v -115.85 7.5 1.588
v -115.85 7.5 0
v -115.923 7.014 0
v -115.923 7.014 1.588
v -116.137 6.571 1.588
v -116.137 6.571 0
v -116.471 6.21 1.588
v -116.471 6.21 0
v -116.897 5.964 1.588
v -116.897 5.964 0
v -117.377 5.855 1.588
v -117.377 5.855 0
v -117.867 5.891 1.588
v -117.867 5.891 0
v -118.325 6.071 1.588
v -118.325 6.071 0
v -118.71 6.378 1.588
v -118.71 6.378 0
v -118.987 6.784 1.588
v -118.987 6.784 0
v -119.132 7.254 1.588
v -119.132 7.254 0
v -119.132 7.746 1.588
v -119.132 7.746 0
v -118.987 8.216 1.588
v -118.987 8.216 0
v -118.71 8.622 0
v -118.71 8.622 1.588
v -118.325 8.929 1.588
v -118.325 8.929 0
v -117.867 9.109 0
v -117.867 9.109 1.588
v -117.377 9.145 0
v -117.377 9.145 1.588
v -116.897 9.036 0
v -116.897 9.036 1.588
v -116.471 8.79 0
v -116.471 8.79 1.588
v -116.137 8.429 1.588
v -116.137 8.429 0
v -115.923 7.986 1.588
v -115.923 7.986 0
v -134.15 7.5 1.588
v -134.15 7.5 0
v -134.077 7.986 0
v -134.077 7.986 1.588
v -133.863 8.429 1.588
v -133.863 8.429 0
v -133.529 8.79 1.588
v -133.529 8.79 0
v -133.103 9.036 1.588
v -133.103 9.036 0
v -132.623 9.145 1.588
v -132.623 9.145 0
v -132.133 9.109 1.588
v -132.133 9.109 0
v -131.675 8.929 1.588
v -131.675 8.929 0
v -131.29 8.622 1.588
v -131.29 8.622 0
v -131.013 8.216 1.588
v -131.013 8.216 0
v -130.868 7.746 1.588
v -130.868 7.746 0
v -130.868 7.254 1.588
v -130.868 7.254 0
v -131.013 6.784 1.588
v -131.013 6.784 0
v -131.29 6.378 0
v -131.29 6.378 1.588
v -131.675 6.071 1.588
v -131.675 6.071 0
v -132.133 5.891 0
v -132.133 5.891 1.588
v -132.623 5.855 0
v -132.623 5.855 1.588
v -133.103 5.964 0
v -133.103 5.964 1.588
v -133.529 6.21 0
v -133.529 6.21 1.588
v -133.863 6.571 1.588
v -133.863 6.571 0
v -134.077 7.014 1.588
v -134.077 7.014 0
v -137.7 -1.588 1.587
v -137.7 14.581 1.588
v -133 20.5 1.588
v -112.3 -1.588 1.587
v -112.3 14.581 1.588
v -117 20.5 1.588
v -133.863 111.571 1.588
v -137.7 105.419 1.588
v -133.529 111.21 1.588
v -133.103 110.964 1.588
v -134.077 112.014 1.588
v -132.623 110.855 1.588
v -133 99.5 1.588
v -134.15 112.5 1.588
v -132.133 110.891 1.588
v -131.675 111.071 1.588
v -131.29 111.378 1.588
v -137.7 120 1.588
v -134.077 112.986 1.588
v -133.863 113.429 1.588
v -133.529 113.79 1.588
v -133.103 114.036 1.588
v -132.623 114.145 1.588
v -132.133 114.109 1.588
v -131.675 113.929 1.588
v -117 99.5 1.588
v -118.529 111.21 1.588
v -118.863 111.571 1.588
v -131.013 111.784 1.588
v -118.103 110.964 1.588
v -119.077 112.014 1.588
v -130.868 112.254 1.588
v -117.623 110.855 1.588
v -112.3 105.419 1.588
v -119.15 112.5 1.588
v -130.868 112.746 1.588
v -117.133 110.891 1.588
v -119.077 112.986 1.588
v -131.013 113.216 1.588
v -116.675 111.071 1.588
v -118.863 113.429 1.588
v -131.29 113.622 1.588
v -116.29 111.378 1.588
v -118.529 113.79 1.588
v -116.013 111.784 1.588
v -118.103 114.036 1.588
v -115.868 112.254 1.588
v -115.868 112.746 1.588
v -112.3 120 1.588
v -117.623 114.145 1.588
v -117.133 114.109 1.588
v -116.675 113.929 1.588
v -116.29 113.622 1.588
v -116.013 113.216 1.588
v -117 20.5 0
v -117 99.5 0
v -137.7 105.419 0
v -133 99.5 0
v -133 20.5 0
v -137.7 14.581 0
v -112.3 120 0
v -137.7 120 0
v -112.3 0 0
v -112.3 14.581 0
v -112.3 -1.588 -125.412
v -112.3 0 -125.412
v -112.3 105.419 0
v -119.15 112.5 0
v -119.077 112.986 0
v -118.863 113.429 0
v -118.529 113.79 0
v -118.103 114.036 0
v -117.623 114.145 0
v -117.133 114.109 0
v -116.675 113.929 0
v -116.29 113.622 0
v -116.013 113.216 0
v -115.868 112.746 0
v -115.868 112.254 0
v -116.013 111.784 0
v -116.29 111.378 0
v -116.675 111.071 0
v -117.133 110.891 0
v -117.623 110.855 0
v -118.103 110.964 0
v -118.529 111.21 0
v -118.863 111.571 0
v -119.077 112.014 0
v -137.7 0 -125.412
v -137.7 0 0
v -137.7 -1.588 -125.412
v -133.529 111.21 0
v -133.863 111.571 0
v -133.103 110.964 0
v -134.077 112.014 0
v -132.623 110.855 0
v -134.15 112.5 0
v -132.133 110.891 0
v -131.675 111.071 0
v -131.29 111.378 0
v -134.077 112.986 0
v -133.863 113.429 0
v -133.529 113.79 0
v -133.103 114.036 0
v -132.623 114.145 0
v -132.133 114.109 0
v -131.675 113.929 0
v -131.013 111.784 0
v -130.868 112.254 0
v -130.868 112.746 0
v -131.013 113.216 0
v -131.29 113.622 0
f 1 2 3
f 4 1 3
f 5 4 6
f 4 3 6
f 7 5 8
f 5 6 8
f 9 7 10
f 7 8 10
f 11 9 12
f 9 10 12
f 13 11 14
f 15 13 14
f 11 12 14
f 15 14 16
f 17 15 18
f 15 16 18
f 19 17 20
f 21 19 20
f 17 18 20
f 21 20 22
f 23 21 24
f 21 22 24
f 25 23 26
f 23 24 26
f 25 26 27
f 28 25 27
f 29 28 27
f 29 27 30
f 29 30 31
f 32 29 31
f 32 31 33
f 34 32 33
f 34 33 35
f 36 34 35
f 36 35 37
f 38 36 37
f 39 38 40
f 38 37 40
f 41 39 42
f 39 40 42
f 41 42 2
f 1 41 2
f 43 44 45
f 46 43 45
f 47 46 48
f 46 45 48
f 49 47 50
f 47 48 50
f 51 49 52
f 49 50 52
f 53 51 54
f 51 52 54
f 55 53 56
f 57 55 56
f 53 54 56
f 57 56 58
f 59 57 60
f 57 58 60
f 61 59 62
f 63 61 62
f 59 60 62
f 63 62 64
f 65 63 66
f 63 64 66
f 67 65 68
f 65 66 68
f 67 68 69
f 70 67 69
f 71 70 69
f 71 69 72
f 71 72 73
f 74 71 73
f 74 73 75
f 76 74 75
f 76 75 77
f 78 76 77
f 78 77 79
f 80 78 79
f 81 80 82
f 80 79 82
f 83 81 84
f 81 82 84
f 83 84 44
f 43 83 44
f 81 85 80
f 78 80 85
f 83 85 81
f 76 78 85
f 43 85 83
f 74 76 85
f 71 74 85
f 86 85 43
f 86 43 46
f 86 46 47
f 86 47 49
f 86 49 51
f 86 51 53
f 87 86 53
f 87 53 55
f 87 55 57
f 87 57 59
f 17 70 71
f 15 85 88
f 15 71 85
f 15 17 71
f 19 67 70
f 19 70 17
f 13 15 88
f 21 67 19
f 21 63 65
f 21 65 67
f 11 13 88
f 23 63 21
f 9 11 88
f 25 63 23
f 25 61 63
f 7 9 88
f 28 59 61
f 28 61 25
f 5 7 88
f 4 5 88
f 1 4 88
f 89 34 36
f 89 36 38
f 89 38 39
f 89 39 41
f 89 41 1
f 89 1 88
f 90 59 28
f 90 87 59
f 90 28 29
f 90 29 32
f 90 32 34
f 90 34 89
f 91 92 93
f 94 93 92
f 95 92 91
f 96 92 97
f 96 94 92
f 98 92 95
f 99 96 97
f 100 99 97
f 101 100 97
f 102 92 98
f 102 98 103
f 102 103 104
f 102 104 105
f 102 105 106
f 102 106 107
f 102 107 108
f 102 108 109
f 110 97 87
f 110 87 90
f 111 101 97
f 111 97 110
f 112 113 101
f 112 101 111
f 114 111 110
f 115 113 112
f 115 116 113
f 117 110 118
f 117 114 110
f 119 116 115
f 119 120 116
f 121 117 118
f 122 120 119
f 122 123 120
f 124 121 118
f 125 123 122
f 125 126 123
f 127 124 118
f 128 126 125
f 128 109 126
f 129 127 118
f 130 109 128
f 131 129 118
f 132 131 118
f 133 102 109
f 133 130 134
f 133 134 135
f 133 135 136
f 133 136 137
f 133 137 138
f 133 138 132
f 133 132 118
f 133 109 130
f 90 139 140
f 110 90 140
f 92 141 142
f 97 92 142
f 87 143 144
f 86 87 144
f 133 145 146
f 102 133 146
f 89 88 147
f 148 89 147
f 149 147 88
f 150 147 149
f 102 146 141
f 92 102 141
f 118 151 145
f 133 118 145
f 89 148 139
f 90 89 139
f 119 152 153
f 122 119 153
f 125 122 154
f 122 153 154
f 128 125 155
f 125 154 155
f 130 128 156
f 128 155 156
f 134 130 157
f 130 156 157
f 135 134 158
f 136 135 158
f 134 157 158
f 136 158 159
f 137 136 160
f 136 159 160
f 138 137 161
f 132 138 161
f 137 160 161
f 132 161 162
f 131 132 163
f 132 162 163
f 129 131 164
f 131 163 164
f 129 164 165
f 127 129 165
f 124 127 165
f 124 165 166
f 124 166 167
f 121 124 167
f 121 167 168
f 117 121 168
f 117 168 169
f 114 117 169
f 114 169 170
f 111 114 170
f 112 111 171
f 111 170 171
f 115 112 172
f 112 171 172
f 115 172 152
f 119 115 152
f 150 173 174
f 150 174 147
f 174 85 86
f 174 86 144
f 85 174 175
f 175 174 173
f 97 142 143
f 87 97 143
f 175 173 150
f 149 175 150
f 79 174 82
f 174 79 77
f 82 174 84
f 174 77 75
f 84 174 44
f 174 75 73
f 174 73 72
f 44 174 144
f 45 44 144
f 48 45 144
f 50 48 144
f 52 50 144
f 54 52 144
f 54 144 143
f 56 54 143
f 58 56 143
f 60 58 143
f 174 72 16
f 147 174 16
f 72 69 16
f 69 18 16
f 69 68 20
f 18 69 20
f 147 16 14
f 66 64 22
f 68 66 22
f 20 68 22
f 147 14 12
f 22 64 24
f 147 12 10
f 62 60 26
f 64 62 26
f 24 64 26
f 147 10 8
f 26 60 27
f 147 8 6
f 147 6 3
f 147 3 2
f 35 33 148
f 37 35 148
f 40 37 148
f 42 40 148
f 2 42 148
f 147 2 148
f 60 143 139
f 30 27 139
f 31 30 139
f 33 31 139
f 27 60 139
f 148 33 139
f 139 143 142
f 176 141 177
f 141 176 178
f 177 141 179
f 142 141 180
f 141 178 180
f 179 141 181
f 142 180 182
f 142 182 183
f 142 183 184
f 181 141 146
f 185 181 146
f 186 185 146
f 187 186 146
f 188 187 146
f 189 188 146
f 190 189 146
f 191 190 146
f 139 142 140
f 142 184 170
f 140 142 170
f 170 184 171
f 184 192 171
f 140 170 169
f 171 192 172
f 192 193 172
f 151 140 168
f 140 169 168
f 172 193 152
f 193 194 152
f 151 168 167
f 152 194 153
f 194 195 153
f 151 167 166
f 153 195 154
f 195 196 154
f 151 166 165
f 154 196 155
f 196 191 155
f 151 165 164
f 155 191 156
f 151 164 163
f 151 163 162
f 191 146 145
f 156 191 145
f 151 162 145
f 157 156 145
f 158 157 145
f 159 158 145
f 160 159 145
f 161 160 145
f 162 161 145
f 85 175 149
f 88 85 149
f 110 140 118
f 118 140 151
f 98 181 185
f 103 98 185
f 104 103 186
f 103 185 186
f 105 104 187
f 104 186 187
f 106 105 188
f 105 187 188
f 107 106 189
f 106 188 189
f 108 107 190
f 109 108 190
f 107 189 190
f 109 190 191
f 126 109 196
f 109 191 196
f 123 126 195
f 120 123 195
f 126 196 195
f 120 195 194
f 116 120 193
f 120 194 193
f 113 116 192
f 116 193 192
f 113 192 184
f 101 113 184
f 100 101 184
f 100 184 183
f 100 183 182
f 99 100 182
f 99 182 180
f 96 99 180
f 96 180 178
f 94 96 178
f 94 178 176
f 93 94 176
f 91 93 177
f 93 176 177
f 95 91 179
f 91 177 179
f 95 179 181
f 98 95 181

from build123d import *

# Parameters (mm, degrees)
BOSS_EXTRUDE1_DEPTH = 1.5875
SKETCH2_W           = 25.4
SKETCH2_H           = 127
BOSS_EXTRUDE2_DEPTH = 1.5875


with BuildPart() as part:
    # Sketch1 → Boss-Extrude1 (new body)
    with BuildSketch(Plane.XY):
        Polygon((-117, 20.5), (-117, 99.5), (-112.3, 105.418518519), (-112.3, 120), (-137.7, 120), (-137.7, 105.418518519), (-133, 99.5), (-133, 20.5), (-137.7, 14.581481481), (-137.7, 0), (-112.3, 0), (-112.3, 14.581481481), align=None)
        with BuildLine():
            ThreePointArc((-130.85, 7.5), (-132.5, 5.85), (-134.15, 7.5))
            ThreePointArc((-134.15, 7.5), (-132.5, 9.15), (-130.85, 7.5))
        make_face(mode=Mode.SUBTRACT)
        with BuildLine():
            ThreePointArc((-119.15, 7.5), (-117.5, 9.15), (-115.85, 7.5))
            ThreePointArc((-115.85, 7.5), (-117.5, 5.85), (-119.15, 7.5))
        make_face(mode=Mode.SUBTRACT)
        with BuildLine():
            ThreePointArc((-130.85, 112.5), (-132.5, 110.85), (-134.15, 112.5))
            ThreePointArc((-134.15, 112.5), (-132.5, 114.15), (-130.85, 112.5))
        make_face(mode=Mode.SUBTRACT)
        with BuildLine():
            ThreePointArc((-115.85, 112.5), (-117.5, 110.85), (-119.15, 112.5))
            ThreePointArc((-119.15, 112.5), (-117.5, 114.15), (-115.85, 112.5))
        make_face(mode=Mode.SUBTRACT)
    extrude(amount=BOSS_EXTRUDE1_DEPTH)

    # Sketch2 → Boss-Extrude2 (add)
    with BuildSketch(Plane(origin=(0, 0, 0), x_dir=(1, 0, 0), z_dir=(0, 1, 0))):
        with Locations((-125, 61.9125)):
            Rectangle(SKETCH2_W, SKETCH2_H)
    extrude(amount=-BOSS_EXTRUDE2_DEPTH)


solid = part.part
